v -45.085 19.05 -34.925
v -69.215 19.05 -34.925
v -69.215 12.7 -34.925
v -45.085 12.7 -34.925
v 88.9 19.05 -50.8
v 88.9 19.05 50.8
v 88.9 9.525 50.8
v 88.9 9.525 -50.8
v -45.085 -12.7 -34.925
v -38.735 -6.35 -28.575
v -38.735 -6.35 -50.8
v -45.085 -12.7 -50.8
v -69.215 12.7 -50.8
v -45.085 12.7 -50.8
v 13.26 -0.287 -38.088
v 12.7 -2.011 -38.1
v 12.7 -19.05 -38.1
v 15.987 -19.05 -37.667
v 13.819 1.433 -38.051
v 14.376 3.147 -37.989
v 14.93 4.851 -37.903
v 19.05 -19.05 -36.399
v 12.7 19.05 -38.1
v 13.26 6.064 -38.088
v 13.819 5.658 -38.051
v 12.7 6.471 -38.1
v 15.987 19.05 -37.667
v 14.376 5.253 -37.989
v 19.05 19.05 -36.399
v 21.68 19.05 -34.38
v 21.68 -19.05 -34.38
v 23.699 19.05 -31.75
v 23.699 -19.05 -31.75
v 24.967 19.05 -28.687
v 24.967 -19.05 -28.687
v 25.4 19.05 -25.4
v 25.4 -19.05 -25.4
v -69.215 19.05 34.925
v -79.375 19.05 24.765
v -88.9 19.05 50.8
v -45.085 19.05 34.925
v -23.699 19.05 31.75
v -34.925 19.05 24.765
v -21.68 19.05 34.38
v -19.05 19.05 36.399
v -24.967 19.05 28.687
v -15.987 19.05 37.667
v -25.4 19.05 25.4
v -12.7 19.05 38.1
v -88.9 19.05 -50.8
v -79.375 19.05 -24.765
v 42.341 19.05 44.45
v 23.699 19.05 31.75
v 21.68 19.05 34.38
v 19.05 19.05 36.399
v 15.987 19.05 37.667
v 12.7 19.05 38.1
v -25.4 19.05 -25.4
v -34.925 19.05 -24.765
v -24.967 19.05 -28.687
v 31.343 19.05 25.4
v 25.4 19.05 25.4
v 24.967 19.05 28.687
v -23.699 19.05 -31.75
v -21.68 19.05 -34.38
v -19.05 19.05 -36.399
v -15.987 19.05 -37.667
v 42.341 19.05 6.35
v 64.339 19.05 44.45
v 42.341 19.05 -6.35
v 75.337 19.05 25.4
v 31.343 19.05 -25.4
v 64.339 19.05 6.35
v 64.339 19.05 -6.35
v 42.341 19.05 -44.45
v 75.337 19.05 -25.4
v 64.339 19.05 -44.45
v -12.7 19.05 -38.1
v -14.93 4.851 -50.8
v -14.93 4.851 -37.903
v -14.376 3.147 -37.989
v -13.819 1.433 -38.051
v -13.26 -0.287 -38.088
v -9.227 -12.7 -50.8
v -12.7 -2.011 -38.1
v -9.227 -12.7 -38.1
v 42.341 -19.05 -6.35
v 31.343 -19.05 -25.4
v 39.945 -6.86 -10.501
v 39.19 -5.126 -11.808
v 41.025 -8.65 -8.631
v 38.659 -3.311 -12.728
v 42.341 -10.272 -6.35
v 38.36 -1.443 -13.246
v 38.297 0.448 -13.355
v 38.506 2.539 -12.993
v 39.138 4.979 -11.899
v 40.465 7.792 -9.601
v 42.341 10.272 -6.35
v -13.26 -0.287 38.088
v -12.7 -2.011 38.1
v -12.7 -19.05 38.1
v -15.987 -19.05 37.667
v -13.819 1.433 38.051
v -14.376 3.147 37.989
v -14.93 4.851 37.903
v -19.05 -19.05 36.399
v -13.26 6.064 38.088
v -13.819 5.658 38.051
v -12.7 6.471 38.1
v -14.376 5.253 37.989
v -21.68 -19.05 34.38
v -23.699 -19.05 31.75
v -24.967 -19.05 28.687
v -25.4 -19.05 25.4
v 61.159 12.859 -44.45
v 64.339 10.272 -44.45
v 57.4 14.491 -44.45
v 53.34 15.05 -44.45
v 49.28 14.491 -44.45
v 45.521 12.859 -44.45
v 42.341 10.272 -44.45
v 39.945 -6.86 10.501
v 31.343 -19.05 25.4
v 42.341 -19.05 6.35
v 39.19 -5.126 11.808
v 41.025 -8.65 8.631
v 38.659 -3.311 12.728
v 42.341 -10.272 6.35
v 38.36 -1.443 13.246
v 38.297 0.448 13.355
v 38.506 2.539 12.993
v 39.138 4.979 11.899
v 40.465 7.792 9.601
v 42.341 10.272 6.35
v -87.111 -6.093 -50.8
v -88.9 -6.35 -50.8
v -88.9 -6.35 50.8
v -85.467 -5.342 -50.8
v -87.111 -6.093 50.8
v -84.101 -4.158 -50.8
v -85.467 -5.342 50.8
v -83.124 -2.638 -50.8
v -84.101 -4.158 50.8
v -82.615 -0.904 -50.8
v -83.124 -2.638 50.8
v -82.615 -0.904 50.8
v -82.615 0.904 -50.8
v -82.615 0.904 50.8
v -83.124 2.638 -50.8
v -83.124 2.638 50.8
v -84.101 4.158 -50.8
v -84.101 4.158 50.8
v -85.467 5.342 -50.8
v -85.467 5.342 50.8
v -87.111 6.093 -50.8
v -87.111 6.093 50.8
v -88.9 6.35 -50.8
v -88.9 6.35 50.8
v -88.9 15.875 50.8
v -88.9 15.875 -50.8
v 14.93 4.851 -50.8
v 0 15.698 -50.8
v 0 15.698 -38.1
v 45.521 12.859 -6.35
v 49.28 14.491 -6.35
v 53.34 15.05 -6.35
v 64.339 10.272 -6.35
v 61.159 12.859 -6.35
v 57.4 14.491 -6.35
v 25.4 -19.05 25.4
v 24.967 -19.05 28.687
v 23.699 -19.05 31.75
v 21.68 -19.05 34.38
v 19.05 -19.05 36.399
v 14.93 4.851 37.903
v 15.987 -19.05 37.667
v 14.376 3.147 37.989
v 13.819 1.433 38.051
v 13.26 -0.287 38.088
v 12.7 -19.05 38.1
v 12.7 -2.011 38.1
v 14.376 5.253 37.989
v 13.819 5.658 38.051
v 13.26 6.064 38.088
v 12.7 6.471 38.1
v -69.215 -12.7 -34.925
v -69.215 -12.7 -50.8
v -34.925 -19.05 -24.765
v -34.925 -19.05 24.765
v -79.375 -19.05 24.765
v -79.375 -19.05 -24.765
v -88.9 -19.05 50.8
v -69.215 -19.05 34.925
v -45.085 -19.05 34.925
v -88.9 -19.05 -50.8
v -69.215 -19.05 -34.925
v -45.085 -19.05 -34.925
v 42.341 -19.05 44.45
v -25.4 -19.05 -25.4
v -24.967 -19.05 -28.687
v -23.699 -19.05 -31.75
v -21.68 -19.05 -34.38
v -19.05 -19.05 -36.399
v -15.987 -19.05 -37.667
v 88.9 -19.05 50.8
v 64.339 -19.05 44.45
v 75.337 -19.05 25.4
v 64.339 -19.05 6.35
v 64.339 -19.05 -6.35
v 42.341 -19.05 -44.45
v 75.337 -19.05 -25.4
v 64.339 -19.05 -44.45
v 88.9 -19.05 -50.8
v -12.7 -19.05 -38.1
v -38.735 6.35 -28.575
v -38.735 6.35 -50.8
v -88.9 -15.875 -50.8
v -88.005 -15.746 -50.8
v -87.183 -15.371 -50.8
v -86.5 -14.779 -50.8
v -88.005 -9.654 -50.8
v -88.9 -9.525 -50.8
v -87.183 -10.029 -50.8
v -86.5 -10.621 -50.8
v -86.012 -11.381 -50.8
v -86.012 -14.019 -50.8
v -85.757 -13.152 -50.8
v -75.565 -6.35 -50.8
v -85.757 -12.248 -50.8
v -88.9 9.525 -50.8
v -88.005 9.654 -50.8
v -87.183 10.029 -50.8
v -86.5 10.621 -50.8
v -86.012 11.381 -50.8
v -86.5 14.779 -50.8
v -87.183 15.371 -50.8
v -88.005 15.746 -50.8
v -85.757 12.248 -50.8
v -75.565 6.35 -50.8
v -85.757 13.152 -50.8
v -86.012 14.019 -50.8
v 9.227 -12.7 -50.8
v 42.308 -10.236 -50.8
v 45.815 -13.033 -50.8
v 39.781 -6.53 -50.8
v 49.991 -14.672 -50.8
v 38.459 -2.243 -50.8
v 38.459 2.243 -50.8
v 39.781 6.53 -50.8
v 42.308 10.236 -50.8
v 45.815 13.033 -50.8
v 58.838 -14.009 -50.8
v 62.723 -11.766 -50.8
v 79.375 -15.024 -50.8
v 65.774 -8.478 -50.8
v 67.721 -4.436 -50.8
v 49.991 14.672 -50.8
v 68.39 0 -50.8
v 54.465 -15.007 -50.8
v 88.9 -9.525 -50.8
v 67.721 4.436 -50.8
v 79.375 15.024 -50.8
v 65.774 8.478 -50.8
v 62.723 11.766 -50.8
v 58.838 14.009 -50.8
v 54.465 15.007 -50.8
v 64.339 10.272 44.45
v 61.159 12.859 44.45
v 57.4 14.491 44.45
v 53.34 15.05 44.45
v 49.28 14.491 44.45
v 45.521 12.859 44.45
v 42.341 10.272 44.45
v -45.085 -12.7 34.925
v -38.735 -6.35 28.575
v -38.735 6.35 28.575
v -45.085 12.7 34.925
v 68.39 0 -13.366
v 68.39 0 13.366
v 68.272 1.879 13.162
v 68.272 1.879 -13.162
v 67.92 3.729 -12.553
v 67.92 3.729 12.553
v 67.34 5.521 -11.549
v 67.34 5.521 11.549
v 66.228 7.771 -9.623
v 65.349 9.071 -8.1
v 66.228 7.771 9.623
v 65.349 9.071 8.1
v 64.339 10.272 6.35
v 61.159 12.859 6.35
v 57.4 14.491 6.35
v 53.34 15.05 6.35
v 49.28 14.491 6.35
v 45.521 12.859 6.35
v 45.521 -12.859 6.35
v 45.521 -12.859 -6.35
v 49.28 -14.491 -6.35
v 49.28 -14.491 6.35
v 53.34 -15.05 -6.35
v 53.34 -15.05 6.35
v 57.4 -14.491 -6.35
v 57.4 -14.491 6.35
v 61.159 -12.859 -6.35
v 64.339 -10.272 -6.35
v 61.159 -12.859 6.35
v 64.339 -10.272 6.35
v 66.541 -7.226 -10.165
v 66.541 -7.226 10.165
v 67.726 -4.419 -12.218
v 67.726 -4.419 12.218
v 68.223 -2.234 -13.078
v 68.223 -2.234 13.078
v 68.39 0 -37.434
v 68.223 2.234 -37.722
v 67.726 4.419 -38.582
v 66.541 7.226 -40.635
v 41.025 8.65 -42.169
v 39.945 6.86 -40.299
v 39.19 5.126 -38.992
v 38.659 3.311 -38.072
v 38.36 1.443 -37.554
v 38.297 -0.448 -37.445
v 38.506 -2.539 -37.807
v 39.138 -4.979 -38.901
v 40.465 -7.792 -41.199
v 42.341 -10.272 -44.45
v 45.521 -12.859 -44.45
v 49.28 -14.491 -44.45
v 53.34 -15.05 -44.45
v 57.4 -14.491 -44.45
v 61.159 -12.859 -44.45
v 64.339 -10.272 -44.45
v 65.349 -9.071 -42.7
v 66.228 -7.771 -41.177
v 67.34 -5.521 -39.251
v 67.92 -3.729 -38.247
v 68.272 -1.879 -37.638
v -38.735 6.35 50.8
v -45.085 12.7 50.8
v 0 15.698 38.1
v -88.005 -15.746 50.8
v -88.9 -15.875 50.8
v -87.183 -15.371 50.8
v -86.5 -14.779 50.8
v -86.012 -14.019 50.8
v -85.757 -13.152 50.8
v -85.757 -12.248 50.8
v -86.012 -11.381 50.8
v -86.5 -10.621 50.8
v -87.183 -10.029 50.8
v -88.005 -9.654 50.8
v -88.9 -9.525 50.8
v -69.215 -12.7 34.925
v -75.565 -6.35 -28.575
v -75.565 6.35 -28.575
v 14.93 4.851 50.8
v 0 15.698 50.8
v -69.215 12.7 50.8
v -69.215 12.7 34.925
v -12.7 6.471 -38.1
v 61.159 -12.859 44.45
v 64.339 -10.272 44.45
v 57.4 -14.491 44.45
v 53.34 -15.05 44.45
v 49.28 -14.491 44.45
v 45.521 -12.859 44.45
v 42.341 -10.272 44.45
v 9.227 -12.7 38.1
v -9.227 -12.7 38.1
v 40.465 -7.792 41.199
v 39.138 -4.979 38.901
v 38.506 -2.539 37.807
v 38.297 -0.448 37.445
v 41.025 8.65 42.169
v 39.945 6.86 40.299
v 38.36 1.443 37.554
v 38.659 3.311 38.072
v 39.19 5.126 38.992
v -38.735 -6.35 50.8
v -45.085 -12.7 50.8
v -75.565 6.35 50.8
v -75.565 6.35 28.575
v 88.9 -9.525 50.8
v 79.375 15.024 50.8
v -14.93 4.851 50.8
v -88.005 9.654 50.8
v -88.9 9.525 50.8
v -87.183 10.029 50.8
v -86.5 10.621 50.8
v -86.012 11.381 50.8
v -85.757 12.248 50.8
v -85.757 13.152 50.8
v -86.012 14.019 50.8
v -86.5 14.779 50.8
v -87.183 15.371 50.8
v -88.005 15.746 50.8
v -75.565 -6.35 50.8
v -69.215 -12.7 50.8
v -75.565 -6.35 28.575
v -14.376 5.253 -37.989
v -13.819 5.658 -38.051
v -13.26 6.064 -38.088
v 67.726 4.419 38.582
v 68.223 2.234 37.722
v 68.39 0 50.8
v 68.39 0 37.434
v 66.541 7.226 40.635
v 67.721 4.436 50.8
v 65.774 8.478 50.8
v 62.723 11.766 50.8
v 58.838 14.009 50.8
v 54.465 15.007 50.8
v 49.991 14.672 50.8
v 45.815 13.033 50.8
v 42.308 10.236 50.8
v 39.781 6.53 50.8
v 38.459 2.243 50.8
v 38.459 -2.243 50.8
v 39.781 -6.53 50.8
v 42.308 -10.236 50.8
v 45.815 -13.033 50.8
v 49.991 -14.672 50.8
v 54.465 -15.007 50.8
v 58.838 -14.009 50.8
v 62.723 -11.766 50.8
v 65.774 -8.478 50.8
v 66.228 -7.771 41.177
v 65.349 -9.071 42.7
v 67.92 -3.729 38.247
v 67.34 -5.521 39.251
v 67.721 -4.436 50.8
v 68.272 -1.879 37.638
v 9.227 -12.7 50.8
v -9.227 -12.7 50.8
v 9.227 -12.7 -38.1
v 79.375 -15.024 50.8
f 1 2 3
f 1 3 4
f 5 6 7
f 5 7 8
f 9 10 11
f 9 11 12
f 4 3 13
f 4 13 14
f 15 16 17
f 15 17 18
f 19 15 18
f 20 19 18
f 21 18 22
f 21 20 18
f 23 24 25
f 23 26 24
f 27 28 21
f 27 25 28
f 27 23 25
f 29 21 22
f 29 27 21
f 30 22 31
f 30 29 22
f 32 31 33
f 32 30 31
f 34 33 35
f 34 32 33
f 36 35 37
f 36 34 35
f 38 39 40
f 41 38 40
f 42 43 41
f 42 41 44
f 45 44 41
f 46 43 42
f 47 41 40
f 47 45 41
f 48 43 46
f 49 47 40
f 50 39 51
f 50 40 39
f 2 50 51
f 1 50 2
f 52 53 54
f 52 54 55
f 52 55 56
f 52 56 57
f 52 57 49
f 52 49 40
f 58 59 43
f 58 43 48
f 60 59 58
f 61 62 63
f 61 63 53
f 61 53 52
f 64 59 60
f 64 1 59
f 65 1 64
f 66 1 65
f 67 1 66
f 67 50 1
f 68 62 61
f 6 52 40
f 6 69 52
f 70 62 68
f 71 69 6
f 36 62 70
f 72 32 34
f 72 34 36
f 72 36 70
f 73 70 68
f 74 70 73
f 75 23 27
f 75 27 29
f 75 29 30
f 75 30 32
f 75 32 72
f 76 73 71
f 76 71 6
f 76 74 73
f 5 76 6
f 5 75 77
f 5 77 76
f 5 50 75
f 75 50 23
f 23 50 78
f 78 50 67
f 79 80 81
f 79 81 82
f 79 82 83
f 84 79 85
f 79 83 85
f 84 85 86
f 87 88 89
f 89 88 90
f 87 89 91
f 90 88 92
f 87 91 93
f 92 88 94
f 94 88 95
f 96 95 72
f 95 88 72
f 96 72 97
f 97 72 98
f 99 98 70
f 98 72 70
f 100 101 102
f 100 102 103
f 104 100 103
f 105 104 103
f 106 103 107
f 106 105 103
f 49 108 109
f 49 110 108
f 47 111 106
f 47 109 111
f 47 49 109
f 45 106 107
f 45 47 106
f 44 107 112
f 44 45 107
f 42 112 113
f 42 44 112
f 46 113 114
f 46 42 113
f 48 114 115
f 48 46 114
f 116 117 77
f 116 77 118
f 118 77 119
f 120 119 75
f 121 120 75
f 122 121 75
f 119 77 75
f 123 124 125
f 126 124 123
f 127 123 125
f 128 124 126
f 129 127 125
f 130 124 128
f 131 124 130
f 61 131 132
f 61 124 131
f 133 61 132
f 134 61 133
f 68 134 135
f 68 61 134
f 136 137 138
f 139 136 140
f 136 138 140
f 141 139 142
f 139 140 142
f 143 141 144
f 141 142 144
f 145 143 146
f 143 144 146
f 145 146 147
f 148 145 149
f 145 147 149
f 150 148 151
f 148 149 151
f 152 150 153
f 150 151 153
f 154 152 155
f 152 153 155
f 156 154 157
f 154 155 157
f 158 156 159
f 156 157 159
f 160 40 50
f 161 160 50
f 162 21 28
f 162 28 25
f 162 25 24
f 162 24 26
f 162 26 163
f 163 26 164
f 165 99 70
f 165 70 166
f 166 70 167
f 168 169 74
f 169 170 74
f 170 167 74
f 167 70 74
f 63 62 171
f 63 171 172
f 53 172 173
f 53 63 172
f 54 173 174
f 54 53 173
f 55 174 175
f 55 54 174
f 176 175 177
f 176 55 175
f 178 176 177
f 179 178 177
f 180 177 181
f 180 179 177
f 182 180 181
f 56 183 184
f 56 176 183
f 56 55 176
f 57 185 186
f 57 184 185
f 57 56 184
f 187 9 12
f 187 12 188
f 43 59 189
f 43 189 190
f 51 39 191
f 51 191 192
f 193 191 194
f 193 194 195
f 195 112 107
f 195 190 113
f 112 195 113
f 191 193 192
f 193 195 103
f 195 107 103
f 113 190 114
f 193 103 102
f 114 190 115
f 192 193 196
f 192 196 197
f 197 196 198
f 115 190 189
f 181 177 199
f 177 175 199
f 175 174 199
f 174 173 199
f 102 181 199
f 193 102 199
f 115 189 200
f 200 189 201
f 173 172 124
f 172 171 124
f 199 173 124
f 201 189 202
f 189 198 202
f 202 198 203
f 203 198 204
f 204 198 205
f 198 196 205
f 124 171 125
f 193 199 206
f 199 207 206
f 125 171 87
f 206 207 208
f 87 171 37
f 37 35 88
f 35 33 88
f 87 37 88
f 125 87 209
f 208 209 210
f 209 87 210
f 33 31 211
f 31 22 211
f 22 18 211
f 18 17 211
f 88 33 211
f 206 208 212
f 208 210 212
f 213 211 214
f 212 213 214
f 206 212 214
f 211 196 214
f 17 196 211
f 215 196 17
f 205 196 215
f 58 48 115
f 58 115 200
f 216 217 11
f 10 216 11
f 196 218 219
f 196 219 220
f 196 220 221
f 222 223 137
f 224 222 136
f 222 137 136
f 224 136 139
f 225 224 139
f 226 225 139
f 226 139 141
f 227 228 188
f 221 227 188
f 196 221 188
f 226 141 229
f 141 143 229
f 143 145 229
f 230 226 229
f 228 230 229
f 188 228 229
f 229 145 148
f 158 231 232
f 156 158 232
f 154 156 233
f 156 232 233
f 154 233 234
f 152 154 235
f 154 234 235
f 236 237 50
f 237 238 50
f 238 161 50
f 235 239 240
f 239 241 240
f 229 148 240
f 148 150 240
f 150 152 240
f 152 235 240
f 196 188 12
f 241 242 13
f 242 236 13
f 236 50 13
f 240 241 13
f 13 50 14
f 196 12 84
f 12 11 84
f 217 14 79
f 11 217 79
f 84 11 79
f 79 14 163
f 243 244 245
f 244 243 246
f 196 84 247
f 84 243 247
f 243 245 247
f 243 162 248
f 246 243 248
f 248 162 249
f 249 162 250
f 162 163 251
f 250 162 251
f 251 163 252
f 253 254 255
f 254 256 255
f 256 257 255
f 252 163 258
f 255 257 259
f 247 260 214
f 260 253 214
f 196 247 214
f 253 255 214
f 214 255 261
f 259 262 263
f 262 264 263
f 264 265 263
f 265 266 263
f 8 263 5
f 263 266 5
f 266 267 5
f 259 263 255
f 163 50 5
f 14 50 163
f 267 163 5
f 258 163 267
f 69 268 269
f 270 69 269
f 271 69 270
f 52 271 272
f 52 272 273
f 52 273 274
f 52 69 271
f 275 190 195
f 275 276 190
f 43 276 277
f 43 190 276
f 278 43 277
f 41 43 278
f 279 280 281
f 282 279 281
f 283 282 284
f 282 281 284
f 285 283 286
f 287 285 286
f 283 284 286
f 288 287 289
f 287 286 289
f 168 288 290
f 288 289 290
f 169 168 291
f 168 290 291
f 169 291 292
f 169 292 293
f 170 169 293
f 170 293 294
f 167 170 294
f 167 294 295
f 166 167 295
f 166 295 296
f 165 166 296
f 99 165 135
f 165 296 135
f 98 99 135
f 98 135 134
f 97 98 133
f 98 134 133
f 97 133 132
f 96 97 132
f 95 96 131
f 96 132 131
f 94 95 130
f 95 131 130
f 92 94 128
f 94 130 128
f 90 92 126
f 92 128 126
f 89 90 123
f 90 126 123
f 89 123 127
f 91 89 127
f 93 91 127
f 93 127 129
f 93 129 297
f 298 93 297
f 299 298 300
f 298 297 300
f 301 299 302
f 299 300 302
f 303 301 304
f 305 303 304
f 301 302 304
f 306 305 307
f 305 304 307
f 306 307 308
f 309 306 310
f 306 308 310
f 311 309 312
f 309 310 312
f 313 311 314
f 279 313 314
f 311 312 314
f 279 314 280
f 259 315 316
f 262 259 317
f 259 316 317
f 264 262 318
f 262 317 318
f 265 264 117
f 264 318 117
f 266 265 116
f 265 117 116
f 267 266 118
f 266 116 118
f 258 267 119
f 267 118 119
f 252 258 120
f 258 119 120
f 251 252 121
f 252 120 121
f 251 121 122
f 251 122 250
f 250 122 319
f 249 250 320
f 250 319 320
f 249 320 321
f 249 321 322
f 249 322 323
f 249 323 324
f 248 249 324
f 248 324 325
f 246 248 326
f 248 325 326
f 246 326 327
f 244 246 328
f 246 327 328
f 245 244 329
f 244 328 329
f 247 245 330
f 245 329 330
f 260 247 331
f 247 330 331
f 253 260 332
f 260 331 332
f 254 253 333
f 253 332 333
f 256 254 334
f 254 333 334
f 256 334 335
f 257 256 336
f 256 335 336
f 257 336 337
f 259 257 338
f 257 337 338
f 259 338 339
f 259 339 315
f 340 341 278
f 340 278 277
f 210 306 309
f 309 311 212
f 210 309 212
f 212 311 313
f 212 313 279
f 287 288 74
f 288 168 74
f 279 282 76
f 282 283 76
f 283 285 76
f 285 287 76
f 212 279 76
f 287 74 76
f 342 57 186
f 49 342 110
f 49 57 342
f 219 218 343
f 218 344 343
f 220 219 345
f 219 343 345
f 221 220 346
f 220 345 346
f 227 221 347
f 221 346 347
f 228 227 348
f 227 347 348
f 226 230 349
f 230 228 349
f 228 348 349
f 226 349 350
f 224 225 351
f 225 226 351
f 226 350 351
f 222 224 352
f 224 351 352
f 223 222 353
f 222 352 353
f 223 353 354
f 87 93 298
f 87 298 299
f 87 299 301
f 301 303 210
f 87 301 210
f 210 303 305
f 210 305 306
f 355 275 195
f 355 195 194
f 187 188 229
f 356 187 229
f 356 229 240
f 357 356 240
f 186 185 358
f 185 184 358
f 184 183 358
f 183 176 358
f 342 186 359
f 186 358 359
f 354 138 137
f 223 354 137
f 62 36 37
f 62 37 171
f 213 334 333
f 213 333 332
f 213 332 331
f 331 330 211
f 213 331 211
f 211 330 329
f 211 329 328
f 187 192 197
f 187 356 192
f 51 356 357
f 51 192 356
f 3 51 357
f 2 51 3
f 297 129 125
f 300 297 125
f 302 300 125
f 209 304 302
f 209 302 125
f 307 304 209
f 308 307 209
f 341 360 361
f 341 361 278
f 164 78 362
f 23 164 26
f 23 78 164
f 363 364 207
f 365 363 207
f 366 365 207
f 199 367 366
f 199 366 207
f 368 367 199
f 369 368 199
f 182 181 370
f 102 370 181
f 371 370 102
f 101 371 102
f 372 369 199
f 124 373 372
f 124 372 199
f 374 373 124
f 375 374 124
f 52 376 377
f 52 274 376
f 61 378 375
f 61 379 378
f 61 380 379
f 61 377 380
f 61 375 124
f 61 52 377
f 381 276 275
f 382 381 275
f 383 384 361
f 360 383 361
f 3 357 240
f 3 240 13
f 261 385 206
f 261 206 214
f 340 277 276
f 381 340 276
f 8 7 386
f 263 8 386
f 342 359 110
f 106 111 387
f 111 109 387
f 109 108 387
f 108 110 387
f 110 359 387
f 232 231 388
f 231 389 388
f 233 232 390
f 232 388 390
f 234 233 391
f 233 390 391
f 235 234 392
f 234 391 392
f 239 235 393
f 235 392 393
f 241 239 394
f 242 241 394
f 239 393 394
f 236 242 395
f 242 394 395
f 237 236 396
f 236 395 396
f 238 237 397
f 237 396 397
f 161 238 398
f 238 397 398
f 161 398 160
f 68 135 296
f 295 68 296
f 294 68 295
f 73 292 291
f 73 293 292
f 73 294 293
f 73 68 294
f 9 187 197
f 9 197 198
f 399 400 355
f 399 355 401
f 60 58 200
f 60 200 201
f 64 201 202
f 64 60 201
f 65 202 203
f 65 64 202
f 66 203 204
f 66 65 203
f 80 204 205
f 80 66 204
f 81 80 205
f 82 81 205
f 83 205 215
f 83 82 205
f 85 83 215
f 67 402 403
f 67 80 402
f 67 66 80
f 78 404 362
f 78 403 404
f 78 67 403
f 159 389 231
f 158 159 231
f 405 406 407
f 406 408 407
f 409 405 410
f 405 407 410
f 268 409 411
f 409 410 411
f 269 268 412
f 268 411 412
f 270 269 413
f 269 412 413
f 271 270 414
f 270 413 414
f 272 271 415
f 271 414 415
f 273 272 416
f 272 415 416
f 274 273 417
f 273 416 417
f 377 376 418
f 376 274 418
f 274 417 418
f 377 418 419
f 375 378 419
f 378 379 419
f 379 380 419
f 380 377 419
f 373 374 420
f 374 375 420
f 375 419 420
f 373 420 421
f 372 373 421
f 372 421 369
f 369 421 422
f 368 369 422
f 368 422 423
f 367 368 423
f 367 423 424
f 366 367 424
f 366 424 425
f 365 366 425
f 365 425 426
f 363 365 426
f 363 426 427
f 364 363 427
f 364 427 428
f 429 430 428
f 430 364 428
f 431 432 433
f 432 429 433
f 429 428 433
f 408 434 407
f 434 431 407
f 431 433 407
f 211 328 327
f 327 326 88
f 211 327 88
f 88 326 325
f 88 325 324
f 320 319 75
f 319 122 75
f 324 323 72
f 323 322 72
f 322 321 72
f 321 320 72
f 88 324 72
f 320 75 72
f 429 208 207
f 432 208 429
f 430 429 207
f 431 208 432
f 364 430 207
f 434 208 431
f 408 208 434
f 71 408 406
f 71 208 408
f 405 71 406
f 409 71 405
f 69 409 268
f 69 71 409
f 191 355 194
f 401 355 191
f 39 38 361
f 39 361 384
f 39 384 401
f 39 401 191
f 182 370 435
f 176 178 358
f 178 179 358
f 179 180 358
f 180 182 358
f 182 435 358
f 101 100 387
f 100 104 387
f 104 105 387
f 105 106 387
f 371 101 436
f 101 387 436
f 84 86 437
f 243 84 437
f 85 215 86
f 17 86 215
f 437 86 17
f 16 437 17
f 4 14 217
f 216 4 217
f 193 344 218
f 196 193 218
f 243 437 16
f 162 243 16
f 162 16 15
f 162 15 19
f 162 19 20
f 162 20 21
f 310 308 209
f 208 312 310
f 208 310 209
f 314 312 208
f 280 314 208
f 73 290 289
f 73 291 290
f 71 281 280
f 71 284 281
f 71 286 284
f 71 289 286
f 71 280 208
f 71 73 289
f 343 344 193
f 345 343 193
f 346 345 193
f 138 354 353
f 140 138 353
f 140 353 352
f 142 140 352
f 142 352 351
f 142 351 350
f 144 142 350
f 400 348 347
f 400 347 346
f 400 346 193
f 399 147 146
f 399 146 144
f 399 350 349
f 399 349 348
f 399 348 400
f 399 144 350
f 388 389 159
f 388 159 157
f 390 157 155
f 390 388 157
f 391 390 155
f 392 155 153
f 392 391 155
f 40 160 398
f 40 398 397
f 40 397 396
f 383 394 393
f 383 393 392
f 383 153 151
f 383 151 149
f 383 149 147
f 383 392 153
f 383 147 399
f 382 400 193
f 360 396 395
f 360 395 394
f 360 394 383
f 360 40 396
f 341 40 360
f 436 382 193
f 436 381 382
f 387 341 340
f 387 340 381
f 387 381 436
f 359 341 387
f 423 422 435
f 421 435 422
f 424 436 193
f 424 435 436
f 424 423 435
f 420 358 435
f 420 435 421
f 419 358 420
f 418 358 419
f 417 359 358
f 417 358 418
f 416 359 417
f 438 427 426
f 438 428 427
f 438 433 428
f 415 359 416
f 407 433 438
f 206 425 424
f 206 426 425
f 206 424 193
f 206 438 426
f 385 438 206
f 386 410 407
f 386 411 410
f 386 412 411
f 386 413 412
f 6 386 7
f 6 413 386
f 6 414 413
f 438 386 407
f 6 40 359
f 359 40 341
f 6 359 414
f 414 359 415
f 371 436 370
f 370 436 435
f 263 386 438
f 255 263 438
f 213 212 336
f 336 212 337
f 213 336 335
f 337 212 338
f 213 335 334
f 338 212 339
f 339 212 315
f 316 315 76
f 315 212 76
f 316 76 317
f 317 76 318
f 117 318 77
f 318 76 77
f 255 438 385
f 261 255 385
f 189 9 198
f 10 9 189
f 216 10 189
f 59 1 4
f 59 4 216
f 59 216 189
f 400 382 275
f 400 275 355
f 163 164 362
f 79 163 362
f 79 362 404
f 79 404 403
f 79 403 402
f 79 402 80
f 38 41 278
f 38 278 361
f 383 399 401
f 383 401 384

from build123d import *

# Parameters (mm, degrees)
SKETCH1_W           = 177.8
SKETCH1_H           = 101.6
BOSS_EXTRUDE1_DEPTH = 19.05
CUT_EXTRUDE1_DEPTH  = 39.1
SKETCH3_R           = 3.175
SKETCH3_R_2         = 6.35
SKETCH3_R_3         = 15.0495
CUT_EXTRUDE2_DEPTH  = 102.6


with BuildPart() as part:
    # Sketch1 → Boss-Extrude1 (new body, symmetric)
    with BuildSketch(Plane(origin=(0, 0, 0), x_dir=(1, 0, 0), z_dir=(0, 1, 0))):
        Rectangle(SKETCH1_W, SKETCH1_H)
    extrude(amount=BOSS_EXTRUDE1_DEPTH, both=True)

    # Sketch2 → Cut-Extrude1 (cut, through all)
    with BuildSketch(Plane(origin=(0, 19.05, 0), x_dir=(1, 0, 0), z_dir=(0, 1, 0))):
        Polygon((-79.375, 24.765), (-69.215, 34.925), (-45.085, 34.925), (-34.925, 24.765), (-34.925, -24.765), (-45.085, -34.925), (-69.215, -34.925), (-79.375, -24.765), align=None)
        with BuildLine():
            Line((-12.7, 38.1), (12.7, 38.1))
            ThreePointArc((12.7, 38.1), (21.680256121, 34.380256121), (25.4, 25.4))
            Line((25.4, 25.4), (25.4, -25.4))
            ThreePointArc((25.4, -25.4), (21.680256121, -34.380256121), (12.7, -38.1))
            Line((12.7, -38.1), (-12.7, -38.1))
            ThreePointArc((-12.7, -38.1), (-21.680256121, -34.380256121), (-25.4, -25.4))
            Line((-25.4, -25.4), (-25.4, 25.4))
            ThreePointArc((-25.4, 25.4), (-21.680256121, 34.380256121), (-12.7, 38.1))
        make_face()
        Polygon((64.338522628, 6.35), (75.337045256, 25.4), (64.338522628, 44.45), (42.341477372, 44.45), (31.342954744, 25.4), (42.341477372, 6.35), align=None)
        Polygon((42.341477372, -6.35), (64.338522628, -6.35), (75.337045256, -25.4), (64.338522628, -44.45), (42.341477372, -44.45), (31.342954744, -25.4), align=None)
    extrude(amount=-CUT_EXTRUDE1_DEPTH, mode=Mode.SUBTRACT)

    # Sketch3 → Cut-Extrude2 (cut, through all)
    with BuildSketch(Plane.XY.offset(50.8)):
        with Locations((-88.9, 12.7)):
            Circle(SKETCH3_R)
        with Locations((-88.9, 0)):
            Circle(SKETCH3_R_2)
        with Locations((-88.9, -12.7)):
            Circle(SKETCH3_R)
        with Locations((53.34, 0)):
            Circle(SKETCH3_R_3)
        Polygon((-75.565, 6.35), (-69.215, 12.7), (-45.085, 12.7), (-38.735, 6.35), (-38.735, -6.35), (-45.085, -12.7), (-69.215, -12.7), (-75.565, -6.35), align=None)
        Polygon((9.227090106, -12.7), (14.929745408, 4.850968343), (0, 15.698063314), (-14.929745408, 4.850968343), (-9.227090106, -12.7), align=None)
        Polygon((88.9, 9.525), (79.375, 15.024261314), (79.375, -15.024261314), (88.9, -9.525), align=None)
    extrude(amount=-CUT_EXTRUDE2_DEPTH, mode=Mode.SUBTRACT)


solid = part.part
